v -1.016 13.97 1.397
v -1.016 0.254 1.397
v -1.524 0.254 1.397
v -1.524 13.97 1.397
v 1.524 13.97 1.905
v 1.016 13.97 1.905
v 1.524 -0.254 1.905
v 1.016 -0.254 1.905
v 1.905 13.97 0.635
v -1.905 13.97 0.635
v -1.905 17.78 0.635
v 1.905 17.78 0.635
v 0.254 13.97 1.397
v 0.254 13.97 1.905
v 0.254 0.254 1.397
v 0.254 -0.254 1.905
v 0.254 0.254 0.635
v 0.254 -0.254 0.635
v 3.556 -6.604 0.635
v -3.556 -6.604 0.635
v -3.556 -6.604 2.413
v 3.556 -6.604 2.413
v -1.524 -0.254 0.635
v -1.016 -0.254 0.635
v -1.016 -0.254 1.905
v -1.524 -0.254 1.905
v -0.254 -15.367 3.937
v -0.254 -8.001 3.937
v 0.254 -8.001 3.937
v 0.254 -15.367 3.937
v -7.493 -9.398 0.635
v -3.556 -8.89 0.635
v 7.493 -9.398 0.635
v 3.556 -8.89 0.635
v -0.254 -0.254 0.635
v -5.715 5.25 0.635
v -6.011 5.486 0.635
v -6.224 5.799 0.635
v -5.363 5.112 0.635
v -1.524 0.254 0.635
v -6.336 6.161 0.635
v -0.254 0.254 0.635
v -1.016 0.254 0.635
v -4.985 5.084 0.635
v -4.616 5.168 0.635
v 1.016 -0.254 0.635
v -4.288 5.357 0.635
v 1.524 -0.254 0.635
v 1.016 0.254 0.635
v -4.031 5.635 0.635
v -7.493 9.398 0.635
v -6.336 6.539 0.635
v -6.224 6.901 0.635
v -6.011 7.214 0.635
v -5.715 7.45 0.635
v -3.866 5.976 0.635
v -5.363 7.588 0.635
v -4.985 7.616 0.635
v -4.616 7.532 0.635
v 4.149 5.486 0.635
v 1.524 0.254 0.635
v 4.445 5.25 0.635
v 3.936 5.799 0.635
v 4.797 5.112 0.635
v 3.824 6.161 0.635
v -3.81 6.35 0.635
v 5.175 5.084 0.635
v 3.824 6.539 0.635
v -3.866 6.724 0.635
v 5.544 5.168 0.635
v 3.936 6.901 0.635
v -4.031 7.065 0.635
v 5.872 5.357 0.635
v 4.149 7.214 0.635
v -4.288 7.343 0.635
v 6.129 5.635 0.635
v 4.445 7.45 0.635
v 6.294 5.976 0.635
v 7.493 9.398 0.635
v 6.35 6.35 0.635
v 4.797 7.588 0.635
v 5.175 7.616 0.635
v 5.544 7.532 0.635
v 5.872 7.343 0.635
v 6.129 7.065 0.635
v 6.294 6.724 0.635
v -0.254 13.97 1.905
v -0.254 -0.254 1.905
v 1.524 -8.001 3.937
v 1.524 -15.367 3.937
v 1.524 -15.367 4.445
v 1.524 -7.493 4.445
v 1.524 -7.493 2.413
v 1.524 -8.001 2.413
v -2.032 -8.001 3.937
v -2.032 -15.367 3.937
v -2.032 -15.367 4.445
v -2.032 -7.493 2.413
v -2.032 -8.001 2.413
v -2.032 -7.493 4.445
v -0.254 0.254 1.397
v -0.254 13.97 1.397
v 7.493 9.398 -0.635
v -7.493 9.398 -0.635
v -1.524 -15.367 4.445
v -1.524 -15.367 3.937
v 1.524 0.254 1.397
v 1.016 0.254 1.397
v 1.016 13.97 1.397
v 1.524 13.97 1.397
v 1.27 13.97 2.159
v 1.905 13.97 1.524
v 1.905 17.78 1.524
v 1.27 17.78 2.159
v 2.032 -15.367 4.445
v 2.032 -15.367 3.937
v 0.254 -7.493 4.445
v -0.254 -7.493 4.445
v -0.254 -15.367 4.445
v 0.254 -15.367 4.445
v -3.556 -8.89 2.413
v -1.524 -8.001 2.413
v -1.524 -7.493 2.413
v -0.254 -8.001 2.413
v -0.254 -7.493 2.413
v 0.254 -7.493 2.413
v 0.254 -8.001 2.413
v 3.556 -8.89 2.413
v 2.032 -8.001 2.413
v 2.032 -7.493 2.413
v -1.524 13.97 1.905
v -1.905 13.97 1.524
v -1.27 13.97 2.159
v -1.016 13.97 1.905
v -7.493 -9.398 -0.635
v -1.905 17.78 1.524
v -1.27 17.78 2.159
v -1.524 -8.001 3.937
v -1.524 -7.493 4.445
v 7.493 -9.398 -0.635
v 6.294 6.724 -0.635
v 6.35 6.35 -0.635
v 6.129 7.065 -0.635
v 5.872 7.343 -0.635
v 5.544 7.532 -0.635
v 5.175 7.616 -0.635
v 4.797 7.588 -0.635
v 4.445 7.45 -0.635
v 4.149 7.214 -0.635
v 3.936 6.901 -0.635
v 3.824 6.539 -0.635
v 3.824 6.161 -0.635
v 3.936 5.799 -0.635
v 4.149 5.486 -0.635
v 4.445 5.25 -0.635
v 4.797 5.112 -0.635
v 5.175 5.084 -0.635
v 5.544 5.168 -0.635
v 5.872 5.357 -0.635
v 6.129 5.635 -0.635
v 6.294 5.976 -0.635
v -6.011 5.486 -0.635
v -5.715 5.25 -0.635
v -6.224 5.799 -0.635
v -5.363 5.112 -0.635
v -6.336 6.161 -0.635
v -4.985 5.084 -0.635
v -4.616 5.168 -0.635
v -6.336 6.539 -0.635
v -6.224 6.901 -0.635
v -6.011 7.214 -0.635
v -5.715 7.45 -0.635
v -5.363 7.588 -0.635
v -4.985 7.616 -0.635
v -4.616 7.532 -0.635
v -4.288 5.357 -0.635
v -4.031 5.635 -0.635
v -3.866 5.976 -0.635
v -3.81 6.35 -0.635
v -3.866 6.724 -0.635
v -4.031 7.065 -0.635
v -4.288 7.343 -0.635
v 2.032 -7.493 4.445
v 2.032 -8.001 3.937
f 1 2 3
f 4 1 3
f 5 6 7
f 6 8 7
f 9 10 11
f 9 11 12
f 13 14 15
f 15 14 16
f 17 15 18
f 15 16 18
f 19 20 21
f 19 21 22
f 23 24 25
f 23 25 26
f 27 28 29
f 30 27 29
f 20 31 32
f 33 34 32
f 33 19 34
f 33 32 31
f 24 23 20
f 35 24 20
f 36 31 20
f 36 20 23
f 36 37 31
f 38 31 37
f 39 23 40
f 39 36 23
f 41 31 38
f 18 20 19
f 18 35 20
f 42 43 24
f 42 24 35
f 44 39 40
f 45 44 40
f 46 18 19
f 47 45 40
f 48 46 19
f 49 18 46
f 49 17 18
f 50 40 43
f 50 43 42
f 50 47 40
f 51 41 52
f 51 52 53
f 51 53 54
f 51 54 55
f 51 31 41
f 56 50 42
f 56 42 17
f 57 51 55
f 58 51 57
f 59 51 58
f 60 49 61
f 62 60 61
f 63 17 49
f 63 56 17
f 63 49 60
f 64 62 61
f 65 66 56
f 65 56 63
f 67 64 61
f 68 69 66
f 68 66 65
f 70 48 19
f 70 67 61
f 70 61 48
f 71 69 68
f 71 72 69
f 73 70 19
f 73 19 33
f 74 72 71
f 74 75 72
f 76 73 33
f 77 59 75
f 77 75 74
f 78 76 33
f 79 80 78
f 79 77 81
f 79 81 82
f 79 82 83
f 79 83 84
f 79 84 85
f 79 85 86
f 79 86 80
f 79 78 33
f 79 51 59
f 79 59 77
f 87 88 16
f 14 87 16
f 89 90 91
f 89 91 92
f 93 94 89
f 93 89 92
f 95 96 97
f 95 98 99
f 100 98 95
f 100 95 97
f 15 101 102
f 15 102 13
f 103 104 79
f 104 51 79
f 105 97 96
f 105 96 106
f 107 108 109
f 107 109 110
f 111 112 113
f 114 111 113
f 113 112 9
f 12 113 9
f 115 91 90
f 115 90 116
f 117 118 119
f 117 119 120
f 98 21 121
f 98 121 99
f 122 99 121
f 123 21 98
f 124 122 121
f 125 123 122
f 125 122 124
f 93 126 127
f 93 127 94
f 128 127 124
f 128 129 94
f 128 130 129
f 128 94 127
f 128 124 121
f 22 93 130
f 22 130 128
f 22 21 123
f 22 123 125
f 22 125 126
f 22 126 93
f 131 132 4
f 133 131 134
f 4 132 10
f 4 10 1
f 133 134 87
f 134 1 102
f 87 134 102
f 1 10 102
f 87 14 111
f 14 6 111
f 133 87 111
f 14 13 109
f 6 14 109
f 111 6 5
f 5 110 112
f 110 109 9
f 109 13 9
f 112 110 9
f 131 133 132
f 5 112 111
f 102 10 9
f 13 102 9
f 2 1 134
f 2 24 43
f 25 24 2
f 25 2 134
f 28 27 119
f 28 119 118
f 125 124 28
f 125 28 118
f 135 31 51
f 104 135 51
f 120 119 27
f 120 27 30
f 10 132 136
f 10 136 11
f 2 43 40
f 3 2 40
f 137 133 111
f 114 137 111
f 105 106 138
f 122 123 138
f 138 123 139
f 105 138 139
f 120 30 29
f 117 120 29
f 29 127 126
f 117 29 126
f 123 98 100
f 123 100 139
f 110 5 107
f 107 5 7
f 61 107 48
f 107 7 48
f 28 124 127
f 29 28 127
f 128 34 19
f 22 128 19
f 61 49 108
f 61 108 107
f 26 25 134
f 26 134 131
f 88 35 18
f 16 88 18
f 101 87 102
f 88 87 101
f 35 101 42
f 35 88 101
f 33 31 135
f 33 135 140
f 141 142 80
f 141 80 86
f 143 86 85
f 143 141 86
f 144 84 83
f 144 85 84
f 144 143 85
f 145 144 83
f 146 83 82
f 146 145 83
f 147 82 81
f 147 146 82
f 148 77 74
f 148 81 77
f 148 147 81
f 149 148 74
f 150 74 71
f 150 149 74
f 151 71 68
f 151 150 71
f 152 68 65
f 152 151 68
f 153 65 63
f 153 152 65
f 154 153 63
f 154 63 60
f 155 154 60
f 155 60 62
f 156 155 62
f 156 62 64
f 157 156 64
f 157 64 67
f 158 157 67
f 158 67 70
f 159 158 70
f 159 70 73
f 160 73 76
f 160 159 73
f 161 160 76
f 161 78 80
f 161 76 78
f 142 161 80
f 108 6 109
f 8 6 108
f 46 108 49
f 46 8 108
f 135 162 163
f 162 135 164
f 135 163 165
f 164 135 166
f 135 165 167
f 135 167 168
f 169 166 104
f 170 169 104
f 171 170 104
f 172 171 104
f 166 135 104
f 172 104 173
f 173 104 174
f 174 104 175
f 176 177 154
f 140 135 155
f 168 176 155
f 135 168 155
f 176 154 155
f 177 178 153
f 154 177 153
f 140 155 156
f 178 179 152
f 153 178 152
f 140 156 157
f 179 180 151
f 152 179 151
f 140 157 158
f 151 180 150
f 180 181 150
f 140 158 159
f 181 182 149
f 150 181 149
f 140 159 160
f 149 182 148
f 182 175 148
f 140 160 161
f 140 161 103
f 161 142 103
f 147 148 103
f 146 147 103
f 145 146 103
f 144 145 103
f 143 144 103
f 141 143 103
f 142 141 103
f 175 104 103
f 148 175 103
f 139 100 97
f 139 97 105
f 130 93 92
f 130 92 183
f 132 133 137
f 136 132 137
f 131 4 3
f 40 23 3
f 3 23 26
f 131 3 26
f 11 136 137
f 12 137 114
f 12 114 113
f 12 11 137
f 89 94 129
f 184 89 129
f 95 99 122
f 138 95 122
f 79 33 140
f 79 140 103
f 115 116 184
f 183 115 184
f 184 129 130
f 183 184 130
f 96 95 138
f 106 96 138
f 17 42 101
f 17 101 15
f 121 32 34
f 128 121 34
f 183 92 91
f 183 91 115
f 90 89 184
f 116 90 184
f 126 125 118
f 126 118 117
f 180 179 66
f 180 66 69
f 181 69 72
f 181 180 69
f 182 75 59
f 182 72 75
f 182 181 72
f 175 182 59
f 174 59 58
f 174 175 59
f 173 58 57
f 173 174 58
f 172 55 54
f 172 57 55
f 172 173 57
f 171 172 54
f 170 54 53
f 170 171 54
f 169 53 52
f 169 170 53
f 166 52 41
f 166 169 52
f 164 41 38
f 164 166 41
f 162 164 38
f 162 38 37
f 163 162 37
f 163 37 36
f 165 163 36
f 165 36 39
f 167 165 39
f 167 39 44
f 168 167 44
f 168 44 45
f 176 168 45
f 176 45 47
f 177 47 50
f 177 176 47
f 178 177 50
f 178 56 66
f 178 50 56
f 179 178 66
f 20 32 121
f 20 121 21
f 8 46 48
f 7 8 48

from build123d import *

# Parameters (mm, degrees)
SKETCH1_W               = 14.986
SKETCH1_H               = 18.796
BOSS_EXTRUDE1_DEPTH     = 0.635
SKETCH2_W               = 7.112
SKETCH2_H               = 2.286
BOSS_EXTRUDE2_DEPTH     = 1.778
SKETCH3_W               = 0.508
SKETCH3_H               = 0.508
BOSS_EXTRUDE3_DEPTH     = 2.032
SKETCH4_W               = 0.508
SKETCH4_H               = 0.508
BOSS_EXTRUDE4_DEPTH     = 7.366
CUT_EXTRUDE1_DEPTH      = 18.515873886
CUT_EXTRUDE1_DEPTH_BACK = 18.515873886
SKETCH5_R               = 1.27
SKETCH6_W               = 0.508
SKETCH6_H               = 0.508
BOSS_EXTRUDE5_DEPTH     = 1.27
SKETCH7_W               = 0.508
SKETCH7_H               = 0.508
BOSS_EXTRUDE6_DEPTH     = 13.716
LPATTERN1_COUNT         = 2
LPATTERN1_PITCH         = 1.27
MIRROR1_COPY_1_SKETCH_W = 0.508
MIRROR1_COPY_1_SKETCH_H = 0.508
MIRROR1_COPY_1_DEPTH    = 1.27
MIRROR1_COPY_2_SKETCH_W = 0.508
MIRROR1_COPY_2_SKETCH_H = 0.508
MIRROR1_COPY_2_DEPTH    = 13.716
MIRROR1_COPY_3_SKETCH_W = 0.508
MIRROR1_COPY_3_SKETCH_H = 0.508
MIRROR1_COPY_3_DEPTH    = 1.27
MIRROR1_COPY_4_SKETCH_W = 0.508
MIRROR1_COPY_4_SKETCH_H = 0.508
MIRROR1_COPY_4_DEPTH    = 13.716
SKETCH8_W               = 3.81
SKETCH8_H               = 1.524
BOSS_EXTRUDE7_DEPTH     = 3.81
CHAMFER1_SIZE           = 0.635


with BuildPart() as part:
    # Sketch1 → Boss-Extrude1 (new, symmetric)
    with BuildSketch(Plane.XY):
        Rectangle(SKETCH1_W, SKETCH1_H)
    extrude(amount=BOSS_EXTRUDE1_DEPTH, both=True)

    # Sketch2 → Boss-Extrude2 (add)
    with BuildSketch(Plane.XY.offset(0.635)):
        with Locations((0, -7.747)):
            Rectangle(SKETCH2_W, SKETCH2_H)
    extrude(amount=BOSS_EXTRUDE2_DEPTH)

    # Sketch3 → Boss-Extrude3 (add)
    with BuildSketch(Plane.XY.offset(2.413)):
        with Locations((-1.778, -7.747)):
            Rectangle(SKETCH3_W, SKETCH3_H)
        with Locations((0, -7.747)):
            Rectangle(SKETCH3_W, SKETCH3_H)
        with Locations((1.778, -7.747)):
            Rectangle(SKETCH3_W, SKETCH3_H)
    extrude(amount=BOSS_EXTRUDE3_DEPTH)

    # Sketch4 → Boss-Extrude4 (add)
    with BuildSketch(Plane.XZ.offset(8.001)):
        with Locations((-1.778, 4.191)):
            Rectangle(SKETCH4_W, SKETCH4_H)
        with Locations((0, 4.191)):
            Rectangle(SKETCH4_W, SKETCH4_H)
        with Locations((1.778, 4.191)):
            Rectangle(SKETCH4_W, SKETCH4_H)
    extrude(amount=BOSS_EXTRUDE4_DEPTH)

    # Sketch5 → Cut-Extrude1 (cut, two sides: drawn at the far end of the back side and taken through both)
    with BuildSketch(Plane.XY.offset(0.635).offset(-CUT_EXTRUDE1_DEPTH_BACK)):
        with Locations((-5.08, 6.35)):
            Circle(SKETCH5_R)
        with Locations((5.08, 6.35)):
            Circle(SKETCH5_R)
    extrude(amount=CUT_EXTRUDE1_DEPTH + CUT_EXTRUDE1_DEPTH_BACK, mode=Mode.SUBTRACT)

    # Sketch6 → Boss-Extrude5 (add)
    with BuildSketch(Plane.XY.offset(0.635)):
        Rectangle(SKETCH6_W, SKETCH6_H)
    boss_extrude5 = extrude(amount=BOSS_EXTRUDE5_DEPTH)

    # Sketch7 → Boss-Extrude6 (add)
    with BuildSketch(Plane(origin=(0, 0.254, 0), x_dir=(1, 0, 0), z_dir=(0, 1, 0))):
        with Locations((0, -1.651)):
            Rectangle(SKETCH7_W, SKETCH7_H)
    boss_extrude6 = extrude(amount=BOSS_EXTRUDE6_DEPTH)

    # LPattern1: Boss-Extrude5, Boss-Extrude6 ×2
    with Locations(*[(i * LPATTERN1_PITCH, 0, 0) for i in range(1, LPATTERN1_COUNT)]):
        add(boss_extrude5)
        add(boss_extrude6)

    # Mirror1 copy 1 sketch → Mirror1 copy 1 (add)
    with BuildSketch(Plane(origin=(-1.27, 0, 0.635), x_dir=(-1, 0, 0), z_dir=(0, 0, 1))):
        Rectangle(MIRROR1_COPY_1_SKETCH_W, MIRROR1_COPY_1_SKETCH_H)
    extrude(amount=MIRROR1_COPY_1_DEPTH)

    # Mirror1 copy 2 sketch → Mirror1 copy 2 (add)
    with BuildSketch(Plane(origin=(-1.27, 0.254, 0), x_dir=(-1, 0, 0), z_dir=(0, 1, 0))):
        with Locations((0, 1.651)):
            Rectangle(MIRROR1_COPY_2_SKETCH_W, MIRROR1_COPY_2_SKETCH_H)
    extrude(amount=MIRROR1_COPY_2_DEPTH)

    # Mirror1 copy 3 sketch → Mirror1 copy 3 (add)
    with BuildSketch(Plane(origin=(0, 0, 0.635), x_dir=(-1, 0, 0), z_dir=(0, 0, 1))):
        Rectangle(MIRROR1_COPY_3_SKETCH_W, MIRROR1_COPY_3_SKETCH_H)
    extrude(amount=MIRROR1_COPY_3_DEPTH)

    # Mirror1 copy 4 sketch → Mirror1 copy 4 (add)
    with BuildSketch(Plane(origin=(0, 0.254, 0), x_dir=(-1, 0, 0), z_dir=(0, 1, 0))):
        with Locations((0, 1.651)):
            Rectangle(MIRROR1_COPY_4_SKETCH_W, MIRROR1_COPY_4_SKETCH_H)
    extrude(amount=MIRROR1_COPY_4_DEPTH)

    # Sketch8 → Boss-Extrude7 (add)
    with BuildSketch(Plane(origin=(0, 13.97, 0), x_dir=(1, 0, 0), z_dir=(0, 1, 0))):
        with Locations((0, -1.397)):
            Rectangle(SKETCH8_W, SKETCH8_H)
    extrude(amount=BOSS_EXTRUDE7_DEPTH)

    # Chamfer1
    chamfer1_edges = [part.edges().sort_by_distance(p)[0] for p in [
        (1.905, 15.875, 2.159),
        (-1.905, 15.875, 2.159),
    ]]
    chamfer(chamfer1_edges, length=CHAMFER1_SIZE - 0.0001)  # a hair under: the kernel refuses the full size


solid = part.part
